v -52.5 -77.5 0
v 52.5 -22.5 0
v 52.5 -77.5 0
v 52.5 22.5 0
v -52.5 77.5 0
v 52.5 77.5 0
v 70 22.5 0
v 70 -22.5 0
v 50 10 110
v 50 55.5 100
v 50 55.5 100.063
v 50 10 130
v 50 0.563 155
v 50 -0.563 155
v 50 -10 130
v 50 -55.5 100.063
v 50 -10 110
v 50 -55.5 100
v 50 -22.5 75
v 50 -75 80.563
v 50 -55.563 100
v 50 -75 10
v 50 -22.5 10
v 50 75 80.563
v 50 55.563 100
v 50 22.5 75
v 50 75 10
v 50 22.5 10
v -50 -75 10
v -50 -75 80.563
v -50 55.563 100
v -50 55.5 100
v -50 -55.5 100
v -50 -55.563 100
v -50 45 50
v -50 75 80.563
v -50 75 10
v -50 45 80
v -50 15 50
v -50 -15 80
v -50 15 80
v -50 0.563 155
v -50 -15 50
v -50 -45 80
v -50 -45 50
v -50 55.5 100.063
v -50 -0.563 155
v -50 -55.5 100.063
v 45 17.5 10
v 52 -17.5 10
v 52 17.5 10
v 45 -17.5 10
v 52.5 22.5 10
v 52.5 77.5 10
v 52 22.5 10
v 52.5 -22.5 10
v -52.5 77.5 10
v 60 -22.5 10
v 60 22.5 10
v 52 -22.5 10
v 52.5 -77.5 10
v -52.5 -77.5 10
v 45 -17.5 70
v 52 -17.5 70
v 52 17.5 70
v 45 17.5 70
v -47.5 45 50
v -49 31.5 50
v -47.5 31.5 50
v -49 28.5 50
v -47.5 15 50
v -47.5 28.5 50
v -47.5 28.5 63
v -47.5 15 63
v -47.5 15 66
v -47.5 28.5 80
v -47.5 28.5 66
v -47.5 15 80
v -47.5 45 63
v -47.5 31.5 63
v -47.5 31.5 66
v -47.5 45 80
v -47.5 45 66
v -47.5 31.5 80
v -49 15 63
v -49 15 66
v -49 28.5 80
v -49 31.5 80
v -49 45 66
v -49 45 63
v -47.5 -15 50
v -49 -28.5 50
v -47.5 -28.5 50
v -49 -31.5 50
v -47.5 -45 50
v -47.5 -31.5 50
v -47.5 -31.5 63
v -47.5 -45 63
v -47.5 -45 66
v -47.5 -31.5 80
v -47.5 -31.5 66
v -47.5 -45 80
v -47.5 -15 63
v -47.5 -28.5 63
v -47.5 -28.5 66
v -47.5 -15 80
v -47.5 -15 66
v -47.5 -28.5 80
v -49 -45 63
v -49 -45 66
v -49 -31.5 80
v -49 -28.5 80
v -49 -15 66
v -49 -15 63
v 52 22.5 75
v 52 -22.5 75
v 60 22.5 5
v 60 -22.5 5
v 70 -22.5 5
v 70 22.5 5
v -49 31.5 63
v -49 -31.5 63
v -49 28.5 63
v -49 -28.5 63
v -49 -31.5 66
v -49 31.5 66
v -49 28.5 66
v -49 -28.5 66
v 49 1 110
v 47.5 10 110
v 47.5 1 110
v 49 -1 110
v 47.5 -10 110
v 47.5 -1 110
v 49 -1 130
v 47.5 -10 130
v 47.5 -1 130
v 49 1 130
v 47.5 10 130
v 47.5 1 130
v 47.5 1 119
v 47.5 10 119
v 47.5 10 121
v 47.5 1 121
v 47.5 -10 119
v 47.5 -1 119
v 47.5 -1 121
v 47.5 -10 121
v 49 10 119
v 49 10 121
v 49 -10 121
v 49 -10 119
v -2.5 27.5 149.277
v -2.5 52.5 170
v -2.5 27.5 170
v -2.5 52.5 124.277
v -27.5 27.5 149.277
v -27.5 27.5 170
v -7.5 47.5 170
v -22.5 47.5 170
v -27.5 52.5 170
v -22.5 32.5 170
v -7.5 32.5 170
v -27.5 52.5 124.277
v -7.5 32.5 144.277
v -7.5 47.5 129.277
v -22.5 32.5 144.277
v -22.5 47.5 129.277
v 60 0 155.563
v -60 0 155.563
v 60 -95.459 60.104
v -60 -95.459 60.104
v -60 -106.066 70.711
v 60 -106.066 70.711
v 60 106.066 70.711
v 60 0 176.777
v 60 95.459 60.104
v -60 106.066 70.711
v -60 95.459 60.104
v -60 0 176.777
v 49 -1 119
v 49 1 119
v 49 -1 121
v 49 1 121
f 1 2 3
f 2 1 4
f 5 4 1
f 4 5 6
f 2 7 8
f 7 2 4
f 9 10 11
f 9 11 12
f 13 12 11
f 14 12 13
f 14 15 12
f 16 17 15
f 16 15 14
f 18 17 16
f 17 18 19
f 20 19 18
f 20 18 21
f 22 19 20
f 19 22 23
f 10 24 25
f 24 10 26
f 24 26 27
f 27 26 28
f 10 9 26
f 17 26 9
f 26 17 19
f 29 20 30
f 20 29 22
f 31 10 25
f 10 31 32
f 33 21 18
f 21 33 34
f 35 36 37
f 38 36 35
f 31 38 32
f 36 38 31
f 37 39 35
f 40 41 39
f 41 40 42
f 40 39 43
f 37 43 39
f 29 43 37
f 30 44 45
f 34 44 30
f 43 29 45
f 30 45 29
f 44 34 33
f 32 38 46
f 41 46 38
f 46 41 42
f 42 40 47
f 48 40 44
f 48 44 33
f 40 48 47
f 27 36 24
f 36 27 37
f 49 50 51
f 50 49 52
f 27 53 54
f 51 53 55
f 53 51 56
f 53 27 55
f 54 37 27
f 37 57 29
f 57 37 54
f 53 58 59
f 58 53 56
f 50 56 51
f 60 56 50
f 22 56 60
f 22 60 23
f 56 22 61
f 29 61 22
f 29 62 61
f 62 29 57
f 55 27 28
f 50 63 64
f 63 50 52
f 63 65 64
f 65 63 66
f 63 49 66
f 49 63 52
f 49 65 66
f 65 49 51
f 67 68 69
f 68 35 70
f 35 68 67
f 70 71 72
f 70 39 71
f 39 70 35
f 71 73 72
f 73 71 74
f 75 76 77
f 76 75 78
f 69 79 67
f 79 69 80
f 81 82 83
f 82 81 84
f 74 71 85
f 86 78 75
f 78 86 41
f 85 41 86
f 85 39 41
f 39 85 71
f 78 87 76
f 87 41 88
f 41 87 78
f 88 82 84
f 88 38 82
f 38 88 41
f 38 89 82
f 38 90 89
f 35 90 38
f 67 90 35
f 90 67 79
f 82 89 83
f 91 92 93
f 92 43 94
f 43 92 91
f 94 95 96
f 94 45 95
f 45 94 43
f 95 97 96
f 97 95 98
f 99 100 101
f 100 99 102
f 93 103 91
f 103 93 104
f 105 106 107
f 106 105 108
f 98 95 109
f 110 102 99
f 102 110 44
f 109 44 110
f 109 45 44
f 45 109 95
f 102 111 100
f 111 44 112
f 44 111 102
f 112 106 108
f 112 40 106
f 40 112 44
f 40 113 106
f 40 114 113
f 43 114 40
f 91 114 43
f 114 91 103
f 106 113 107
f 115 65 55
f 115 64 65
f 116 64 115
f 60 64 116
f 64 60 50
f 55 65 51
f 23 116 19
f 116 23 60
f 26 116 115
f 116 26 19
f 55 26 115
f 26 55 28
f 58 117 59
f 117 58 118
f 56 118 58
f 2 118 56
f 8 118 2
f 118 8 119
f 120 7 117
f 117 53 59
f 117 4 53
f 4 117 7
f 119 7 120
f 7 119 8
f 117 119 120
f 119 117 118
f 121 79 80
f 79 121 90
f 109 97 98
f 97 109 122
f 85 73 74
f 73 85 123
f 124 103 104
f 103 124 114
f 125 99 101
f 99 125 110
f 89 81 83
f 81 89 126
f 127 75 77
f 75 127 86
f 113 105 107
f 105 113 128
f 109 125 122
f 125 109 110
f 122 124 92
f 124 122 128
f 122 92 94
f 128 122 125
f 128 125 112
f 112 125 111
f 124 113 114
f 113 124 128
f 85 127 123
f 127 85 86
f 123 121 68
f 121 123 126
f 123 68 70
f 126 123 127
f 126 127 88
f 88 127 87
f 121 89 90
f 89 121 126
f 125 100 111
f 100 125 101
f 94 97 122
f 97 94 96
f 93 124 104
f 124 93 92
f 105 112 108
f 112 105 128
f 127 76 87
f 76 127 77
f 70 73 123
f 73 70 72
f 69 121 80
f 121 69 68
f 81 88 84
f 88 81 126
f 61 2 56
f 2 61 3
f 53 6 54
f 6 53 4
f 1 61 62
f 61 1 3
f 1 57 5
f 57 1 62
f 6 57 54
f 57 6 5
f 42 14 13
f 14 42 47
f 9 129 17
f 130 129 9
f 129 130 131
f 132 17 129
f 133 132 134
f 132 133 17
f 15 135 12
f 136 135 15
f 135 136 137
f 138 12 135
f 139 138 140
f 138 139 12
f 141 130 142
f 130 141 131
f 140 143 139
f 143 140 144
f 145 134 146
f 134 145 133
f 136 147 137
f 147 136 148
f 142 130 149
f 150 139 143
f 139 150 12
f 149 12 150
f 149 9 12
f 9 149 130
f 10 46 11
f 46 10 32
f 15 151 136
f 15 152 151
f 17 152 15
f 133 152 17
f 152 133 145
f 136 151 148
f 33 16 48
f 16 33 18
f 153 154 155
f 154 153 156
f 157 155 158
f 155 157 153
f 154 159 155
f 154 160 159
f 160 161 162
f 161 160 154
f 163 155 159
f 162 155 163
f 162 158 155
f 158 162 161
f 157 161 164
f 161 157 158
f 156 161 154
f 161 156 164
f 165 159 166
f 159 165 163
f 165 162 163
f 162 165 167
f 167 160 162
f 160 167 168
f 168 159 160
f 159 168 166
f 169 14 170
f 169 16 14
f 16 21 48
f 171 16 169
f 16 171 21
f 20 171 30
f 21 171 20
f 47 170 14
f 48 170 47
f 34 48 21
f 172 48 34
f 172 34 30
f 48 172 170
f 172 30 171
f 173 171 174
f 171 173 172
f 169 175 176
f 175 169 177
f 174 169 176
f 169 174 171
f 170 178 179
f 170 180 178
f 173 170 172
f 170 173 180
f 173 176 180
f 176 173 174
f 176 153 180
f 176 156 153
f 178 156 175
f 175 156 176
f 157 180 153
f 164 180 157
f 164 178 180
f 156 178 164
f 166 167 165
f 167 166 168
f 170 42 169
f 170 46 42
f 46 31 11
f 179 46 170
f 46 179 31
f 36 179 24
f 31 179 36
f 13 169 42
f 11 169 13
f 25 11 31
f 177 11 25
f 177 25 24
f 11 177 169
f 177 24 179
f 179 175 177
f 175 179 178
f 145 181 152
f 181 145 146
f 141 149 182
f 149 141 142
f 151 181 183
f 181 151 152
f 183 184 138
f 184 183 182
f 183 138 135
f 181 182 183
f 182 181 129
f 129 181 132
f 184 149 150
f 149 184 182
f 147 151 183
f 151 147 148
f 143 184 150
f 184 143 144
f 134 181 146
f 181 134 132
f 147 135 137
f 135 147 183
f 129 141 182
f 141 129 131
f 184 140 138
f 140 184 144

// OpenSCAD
union()
{
    union()
    {
        difference()
        {
            linear_extrude(height = 100.0, twist = 0.0, scale = 1.0, slices = 1, center = false)
            {
                scale([100.0, 150.0])
                {
                    M52();
                }
            }
            translate([50.0, 0.0, 10.0])
            {
                linear_extrude(height = 60.0, twist = 0.0, scale = 1.0, slices = 1, center = false)
                {
                    scale([10.0, 35.0])
                    {
                        M52();
                    }
                }
            }
            translate([-50.0, 30.0, 50.0])
            {
                linear_extrude(height = 30.0, twist = 0.0, scale = 1.0, slices = 1, center = false)
                {
                    scale([5.0, 30.0])
                    {
                        M52();
                    }
                }
            }
            translate([-50.0, -30.0, 50.0])
            {
                linear_extrude(height = 30.0, twist = 0.0, scale = 1.0, slices = 1, center = false)
                {
                    scale([5.0, 30.0])
                    {
                        M52();
                    }
                }
            }
        }
        linear_extrude(height = 10.0, twist = 0.0, scale = 1.0, slices = 1, center = false)
        {
            scale([105.0, 155.0])
            {
                M52();
            }
        }
        difference()
        {
            translate([47.0, 0.0, 5.0])
            {
                linear_extrude(height = 70.0, twist = 0.0, scale = 1.0, slices = 1, center = false)
                {
                    scale([10.0, 45.0])
                    {
                        M52();
                    }
                }
            }
            translate([50.0, 0.0, 10.0])
            {
                linear_extrude(height = 60.0, twist = 0.0, scale = 1.0, slices = 1, center = false)
                {
                    scale([10.0, 35.0])
                    {
                        M52();
                    }
                }
            }
        }
        union()
        {
            translate([50.0, 0.0, 0.0])
            {
                linear_extrude(height = 10.0, twist = 0.0, scale = 1.0, slices = 1, center = false)
                {
                    scale([20.0, 45.0])
                    {
                        M52();
                    }
                }
            }
            translate([60.0, 0.0, 0.0])
            {
                linear_extrude(height = 5.0, twist = 0.0, scale = 1.0, slices = 1, center = false)
                {
                    scale([20.0, 45.0])
                    {
                        M52();
                    }
                }
            }
        }
        union()
        {
            translate([-48.0, 0.0, 63.0])
            {
                linear_extrude(height = 3.0, twist = 0.0, scale = 1.0, slices = 1, center = false)
                {
                    scale([2.0, 90.0])
                    {
                        M52();
                    }
                }
            }
            translate([-48.0, -30.0, 50.0])
            {
                linear_extrude(height = 30.0, twist = 0.0, scale = 1.0, slices = 1, center = false)
                {
                    scale([2.0, 3.0])
                    {
                        M52();
                    }
                }
            }
            translate([-48.0, 30.0, 50.0])
            {
                linear_extrude(height = 30.0, twist = 0.0, scale = 1.0, slices = 1, center = false)
                {
                    scale([2.0, 3.0])
                    {
                        M52();
                    }
                }
            }
            translate([48.0, 30.0, 50.0])
            {
                linear_extrude(height = 30.0, twist = 0.0, scale = 1.0, slices = 1, center = false)
                {
                    scale([2.0, 3.0])
                    {
                        M52();
                    }
                }
            }
        }
    }
    union()
    {
        rotate([45.0, 0.0, 0.0])
        {
            translate([0.0, 50.0, 110.0])
            {
                linear_extrude(height = 15.0, twist = 0.0, scale = 1.0, slices = 1, center = false)
                {
                    scale([120.0, 150.0])
                    {
                        M52();
                    }
                }
            }
        }
        rotate([-45.0, 0.0, 0.0])
        {
            translate([0.0, -50.0, 110.0])
            {
                linear_extrude(height = 15.0, twist = 0.0, scale = 1.0, slices = 1, center = false)
                {
                    scale([120.0, 150.0])
                    {
                        M52();
                    }
                }
            }
        }
        union()
        {
            difference()
            {
                translate([0.0, 0.0, 95.0])
                {
                    linear_extrude(height = 60.0, twist = 0.0, scale = 1.0, slices = 1, center = false)
                    {
                        scale([100.0, 40.0])
                        {
                            M52();
                        }
                    }
                }
                translate([50.0, 0.0, 110.0])
                {
                    linear_extrude(height = 20.0, twist = 0.0, scale = 1.0, slices = 1, center = false)
                    {
                        scale([5.0, 30.0])
                        {
                            M52();
                        }
                    }
                }
            }
            translate([0.0, 25.0, 95.0])
            {
                linear_extrude(height = 41.0, twist = 0.0, scale = 1.0, slices = 1, center = false)
                {
                    scale([100.0, 30.0])
                    {
                        M52();
                    }
                }
            }
            translate([0.0, 45.0, 95.0])
            {
                linear_extrude(height = 21.0, twist = 0.0, scale = 1.0, slices = 1, center = false)
                {
                    scale([100.0, 21.0])
                    {
                        M52();
                    }
                }
            }
            translate([0.0, -25.0, 95.0])
            {
                linear_extrude(height = 41.0, twist = 0.0, scale = 1.0, slices = 1, center = false)
                {
                    scale([100.0, 30.0])
                    {
                        M52();
                    }
                }
            }
            translate([0.0, -45.0, 95.0])
            {
                linear_extrude(height = 21.0, twist = 0.0, scale = 1.0, slices = 1, center = false)
                {
                    scale([100.0, 21.0])
                    {
                        M52();
                    }
                }
            }
        }
        difference()
        {
            translate([-15.0, 40.0, 110.0])
            {
                linear_extrude(height = 60.0, twist = 0.0, scale = 1.0, slices = 1, center = false)
                {
                    scale([25.0, 25.0])
                    {
                        M52();
                    }
                }
            }
            translate([-15.0, 40.0, 110.0])
            {
                linear_extrude(height = 60.0, twist = 0.0, scale = 1.0, slices = 1, center = false)
                {
                    scale([15.0, 15.0])
                    {
                        M52();
                    }
                }
            }
        }
        translate([48.0, 0.0, 119.0])
        {
            linear_extrude(height = 2.0, twist = 0.0, scale = 1.0, slices = 1, center = false)
            {
                scale([2.0, 20.0])
                {
                    M52();
                }
            }
        }
        translate([48.0, 0.0, 110.0])
        {
            linear_extrude(height = 20.0, twist = 0.0, scale = 1.0, slices = 1, center = false)
            {
                scale([2.0, 2.0])
                {
                    M52();
                }
            }
        }
    }
}

module M52()
{
    polygon
    (
        points =
        [
            [-0.5, -0.5], 
            [0.5, -0.5], 
            [0.5, 0.5], 
            [-0.5, 0.5]
        ],
        paths =
        [
            [0, 1, 2, 3]
        ]
    );
}
